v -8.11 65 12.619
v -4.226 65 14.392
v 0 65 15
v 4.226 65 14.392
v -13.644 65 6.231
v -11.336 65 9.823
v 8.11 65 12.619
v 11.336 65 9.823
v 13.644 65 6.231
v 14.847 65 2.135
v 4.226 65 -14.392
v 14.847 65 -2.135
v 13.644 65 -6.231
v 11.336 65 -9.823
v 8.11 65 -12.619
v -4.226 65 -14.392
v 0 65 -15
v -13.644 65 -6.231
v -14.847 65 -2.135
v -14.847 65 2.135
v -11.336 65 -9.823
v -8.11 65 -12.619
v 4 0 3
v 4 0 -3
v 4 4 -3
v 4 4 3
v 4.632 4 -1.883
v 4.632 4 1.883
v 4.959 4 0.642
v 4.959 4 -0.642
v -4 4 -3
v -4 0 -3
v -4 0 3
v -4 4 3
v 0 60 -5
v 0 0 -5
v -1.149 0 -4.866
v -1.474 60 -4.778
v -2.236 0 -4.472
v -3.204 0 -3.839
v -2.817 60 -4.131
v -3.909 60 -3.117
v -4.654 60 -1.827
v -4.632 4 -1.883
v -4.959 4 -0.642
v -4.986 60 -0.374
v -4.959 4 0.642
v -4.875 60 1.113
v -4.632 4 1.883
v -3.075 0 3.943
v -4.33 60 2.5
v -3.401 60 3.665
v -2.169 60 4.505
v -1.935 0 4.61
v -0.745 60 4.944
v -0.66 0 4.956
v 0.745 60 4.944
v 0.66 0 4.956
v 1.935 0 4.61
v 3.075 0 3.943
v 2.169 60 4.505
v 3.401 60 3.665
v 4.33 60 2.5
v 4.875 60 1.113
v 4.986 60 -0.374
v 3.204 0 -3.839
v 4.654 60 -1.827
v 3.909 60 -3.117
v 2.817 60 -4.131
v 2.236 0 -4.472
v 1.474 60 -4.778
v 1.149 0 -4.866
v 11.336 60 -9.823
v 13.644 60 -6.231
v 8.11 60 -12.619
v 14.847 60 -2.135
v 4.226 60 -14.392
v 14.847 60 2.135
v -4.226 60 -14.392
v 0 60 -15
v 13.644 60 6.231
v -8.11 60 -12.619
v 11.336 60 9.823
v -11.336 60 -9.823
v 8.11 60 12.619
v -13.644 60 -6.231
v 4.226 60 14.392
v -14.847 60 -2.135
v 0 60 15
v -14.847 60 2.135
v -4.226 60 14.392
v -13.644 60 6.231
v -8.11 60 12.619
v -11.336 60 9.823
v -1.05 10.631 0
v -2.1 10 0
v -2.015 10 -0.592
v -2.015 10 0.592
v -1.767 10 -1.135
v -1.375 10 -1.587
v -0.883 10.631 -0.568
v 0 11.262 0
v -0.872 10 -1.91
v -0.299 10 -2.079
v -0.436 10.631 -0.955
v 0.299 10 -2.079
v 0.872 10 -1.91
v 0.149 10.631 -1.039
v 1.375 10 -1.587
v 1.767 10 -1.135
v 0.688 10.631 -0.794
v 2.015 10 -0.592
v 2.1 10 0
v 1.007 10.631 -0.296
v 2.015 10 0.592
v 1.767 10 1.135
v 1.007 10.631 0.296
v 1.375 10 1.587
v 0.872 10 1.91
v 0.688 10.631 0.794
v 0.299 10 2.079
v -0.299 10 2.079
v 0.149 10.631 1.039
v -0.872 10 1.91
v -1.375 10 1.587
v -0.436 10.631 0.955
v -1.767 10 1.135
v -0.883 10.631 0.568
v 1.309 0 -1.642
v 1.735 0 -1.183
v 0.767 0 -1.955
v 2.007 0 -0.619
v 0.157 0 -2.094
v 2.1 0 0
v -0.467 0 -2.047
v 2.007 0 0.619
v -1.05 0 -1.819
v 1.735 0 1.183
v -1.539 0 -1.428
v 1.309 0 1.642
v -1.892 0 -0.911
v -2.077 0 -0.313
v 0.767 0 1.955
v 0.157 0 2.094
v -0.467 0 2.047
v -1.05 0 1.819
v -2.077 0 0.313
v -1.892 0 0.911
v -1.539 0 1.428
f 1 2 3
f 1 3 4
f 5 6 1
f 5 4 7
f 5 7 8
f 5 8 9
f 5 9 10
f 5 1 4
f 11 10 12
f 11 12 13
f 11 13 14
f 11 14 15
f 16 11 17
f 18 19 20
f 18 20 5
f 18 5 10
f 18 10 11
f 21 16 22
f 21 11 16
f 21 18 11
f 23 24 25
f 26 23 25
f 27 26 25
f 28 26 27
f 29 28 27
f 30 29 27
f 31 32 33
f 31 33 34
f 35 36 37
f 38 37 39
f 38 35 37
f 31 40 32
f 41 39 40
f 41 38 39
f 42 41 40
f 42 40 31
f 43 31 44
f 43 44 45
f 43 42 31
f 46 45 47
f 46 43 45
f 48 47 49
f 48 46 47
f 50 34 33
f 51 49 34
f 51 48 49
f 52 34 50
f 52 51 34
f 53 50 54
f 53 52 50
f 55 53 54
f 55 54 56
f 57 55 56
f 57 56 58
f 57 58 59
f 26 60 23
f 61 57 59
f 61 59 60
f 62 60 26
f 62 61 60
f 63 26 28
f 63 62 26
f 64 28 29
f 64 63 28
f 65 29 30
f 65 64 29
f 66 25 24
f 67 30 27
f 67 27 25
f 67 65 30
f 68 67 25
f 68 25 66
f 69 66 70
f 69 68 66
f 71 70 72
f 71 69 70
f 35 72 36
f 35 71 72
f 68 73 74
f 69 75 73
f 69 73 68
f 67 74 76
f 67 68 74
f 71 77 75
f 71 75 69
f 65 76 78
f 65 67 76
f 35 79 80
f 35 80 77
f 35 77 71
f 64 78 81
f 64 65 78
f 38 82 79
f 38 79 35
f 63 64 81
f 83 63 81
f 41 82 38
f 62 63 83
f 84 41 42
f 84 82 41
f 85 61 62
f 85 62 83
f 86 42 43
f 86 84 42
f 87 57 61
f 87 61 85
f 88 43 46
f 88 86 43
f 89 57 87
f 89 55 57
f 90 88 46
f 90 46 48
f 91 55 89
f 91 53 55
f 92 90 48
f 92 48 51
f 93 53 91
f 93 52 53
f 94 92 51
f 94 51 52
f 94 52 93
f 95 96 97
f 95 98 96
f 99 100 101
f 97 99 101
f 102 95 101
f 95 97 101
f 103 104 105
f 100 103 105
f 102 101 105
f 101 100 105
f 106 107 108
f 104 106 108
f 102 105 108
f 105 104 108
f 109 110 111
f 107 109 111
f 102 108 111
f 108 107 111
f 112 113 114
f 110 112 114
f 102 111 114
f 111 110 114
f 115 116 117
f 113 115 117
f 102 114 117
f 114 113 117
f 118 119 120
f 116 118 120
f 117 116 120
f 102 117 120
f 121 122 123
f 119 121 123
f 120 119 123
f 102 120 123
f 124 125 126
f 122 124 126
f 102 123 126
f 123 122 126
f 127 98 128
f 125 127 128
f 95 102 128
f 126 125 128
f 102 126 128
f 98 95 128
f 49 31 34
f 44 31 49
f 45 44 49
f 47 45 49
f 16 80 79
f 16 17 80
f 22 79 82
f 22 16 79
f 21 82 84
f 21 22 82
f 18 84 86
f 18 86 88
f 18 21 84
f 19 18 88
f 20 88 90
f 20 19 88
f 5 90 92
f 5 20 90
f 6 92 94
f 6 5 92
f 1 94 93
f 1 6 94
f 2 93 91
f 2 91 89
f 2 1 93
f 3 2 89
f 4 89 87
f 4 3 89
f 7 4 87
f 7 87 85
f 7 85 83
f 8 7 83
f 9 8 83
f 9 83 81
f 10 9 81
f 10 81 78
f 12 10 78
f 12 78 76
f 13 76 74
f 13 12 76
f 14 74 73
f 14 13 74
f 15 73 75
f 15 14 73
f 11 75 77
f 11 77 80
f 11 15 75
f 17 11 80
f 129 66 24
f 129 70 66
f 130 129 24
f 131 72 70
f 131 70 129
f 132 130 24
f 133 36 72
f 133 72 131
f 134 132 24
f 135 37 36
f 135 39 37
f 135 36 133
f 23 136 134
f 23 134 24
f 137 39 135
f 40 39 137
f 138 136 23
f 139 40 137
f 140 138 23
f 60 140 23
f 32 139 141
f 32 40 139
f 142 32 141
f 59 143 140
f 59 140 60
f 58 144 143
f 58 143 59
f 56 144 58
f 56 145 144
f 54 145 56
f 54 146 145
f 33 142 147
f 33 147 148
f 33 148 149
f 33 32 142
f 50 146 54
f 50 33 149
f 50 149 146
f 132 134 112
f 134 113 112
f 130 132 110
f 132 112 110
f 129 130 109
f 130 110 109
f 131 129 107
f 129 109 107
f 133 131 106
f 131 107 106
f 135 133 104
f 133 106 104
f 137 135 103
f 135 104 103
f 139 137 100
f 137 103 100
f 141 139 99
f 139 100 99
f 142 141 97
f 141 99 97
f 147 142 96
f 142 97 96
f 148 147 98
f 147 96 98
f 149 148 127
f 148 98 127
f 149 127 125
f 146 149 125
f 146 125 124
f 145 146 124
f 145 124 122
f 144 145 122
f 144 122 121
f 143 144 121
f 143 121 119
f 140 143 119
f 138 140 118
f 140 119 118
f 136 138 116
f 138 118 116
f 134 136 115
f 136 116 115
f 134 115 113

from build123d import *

# Parameters (mm, degrees)
BROCA_DE_ROSQUEAR_PARA_TARRAXA_DE_M51_D     = 4.2
BROCA_DE_ROSQUEAR_PARA_TARRAXA_DE_M51_DEPTH = 10
BROCA_DE_ROSQUEAR_PARA_TARRAXA_DE_M51_TIP   = 1.2618073
CORTE_EXTRUS_O1_DEPTH                       = 69.373971656
CORTE_EXTRUS_O1_DEPTH_BACK                  = 69.373971656
ESBO_O8_W                                   = 1
ESBO_O8_H                                   = 4


with BuildPart() as part:
    # Esboço1 → Revolução1 (revolve)
    with BuildSketch(Plane.XY, mode=Mode.PRIVATE) as revolu_o1_sk:
        Polygon((0, 0), (-5, 0), (-5, 60), (-15, 60), (-15, 65), (0, 65), align=None)
    revolve(revolu_o1_sk.sketch.rotate(Axis((0, 0, 0), (0, 1, 0)), 270), axis=Axis((0, 0, 0), (0, 1, 0)))

    # Broca de rosquear para tarraxa de M51
    with Locations(Plane(origin=(0, 0, 0), x_dir=(-1, 0, 0), z_dir=(0, -1, 0))):
        with Locations((0, 0)):
            Hole(BROCA_DE_ROSQUEAR_PARA_TARRAXA_DE_M51_D / 2, depth=BROCA_DE_ROSQUEAR_PARA_TARRAXA_DE_M51_DEPTH)
            with Locations((0, 0, -(BROCA_DE_ROSQUEAR_PARA_TARRAXA_DE_M51_DEPTH + BROCA_DE_ROSQUEAR_PARA_TARRAXA_DE_M51_TIP / 2))):  # 118° drill point
                Cone(0, BROCA_DE_ROSQUEAR_PARA_TARRAXA_DE_M51_D / 2, BROCA_DE_ROSQUEAR_PARA_TARRAXA_DE_M51_TIP, mode=Mode.SUBTRACT)

    # Esboço8 → Corte-extrusão1 (cut, two sides: drawn at the far end of the back side and taken through both)
    with BuildSketch(Plane.XY.offset(-CORTE_EXTRUS_O1_DEPTH_BACK)):
        with Locations((4.5, 2)):
            Rectangle(ESBO_O8_W, ESBO_O8_H)
        with Locations((-4.5, 2)):
            Rectangle(ESBO_O8_W, ESBO_O8_H)
    extrude(amount=CORTE_EXTRUS_O1_DEPTH + CORTE_EXTRUS_O1_DEPTH_BACK, mode=Mode.SUBTRACT)


solid = part.part
